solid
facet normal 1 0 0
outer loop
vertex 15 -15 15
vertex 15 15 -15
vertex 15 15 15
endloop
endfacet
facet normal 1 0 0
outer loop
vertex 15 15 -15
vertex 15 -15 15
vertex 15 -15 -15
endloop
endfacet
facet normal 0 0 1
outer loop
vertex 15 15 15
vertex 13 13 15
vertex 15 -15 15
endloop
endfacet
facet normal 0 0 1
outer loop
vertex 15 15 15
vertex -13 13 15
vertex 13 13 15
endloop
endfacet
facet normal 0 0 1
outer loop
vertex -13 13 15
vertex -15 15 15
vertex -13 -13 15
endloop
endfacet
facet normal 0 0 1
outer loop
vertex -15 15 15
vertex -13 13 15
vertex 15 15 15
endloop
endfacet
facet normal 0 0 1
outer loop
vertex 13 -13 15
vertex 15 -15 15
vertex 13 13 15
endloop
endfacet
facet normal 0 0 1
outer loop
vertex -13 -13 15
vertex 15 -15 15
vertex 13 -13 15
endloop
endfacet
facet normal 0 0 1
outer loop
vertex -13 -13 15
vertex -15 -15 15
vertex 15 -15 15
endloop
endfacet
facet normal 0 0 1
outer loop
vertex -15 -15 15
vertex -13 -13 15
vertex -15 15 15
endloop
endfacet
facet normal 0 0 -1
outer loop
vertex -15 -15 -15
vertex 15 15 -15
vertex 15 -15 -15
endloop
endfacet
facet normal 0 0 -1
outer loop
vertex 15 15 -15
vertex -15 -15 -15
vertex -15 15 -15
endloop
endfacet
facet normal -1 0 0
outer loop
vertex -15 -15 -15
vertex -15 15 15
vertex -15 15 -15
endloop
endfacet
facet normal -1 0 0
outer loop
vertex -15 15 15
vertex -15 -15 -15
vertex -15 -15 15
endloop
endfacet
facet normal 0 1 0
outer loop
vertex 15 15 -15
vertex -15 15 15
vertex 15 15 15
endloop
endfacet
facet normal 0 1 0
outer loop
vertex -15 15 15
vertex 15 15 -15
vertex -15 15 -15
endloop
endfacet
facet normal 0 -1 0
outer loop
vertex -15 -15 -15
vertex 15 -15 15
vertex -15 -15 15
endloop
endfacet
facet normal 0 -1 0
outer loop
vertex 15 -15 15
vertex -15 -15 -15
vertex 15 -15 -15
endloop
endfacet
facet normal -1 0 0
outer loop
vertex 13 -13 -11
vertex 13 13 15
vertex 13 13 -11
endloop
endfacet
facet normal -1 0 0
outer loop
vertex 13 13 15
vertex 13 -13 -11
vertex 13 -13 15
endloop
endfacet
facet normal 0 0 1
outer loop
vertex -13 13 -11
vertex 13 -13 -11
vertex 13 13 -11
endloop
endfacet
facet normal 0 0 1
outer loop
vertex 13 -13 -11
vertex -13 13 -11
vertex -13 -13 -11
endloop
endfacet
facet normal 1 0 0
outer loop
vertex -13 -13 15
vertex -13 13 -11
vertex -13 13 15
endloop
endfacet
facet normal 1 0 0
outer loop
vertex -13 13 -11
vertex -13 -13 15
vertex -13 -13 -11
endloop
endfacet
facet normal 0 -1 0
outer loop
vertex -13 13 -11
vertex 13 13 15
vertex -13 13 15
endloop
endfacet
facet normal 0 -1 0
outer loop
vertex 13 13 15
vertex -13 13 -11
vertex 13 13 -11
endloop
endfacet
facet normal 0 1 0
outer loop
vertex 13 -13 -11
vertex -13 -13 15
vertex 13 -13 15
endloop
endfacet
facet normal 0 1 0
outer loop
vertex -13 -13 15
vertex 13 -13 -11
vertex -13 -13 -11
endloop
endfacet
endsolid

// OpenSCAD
// box.scad: an open box, the fixture's only model.

/* [Box] */
// Outside size (mm)
size = 30; // [10:5:100]
// Wall and floor (mm)
wall = 2; // [1:0.5:5]

difference() {
  cube(size, center = true);
  translate([0, 0, wall]) cube(size - 2 * wall, center = true);
}
